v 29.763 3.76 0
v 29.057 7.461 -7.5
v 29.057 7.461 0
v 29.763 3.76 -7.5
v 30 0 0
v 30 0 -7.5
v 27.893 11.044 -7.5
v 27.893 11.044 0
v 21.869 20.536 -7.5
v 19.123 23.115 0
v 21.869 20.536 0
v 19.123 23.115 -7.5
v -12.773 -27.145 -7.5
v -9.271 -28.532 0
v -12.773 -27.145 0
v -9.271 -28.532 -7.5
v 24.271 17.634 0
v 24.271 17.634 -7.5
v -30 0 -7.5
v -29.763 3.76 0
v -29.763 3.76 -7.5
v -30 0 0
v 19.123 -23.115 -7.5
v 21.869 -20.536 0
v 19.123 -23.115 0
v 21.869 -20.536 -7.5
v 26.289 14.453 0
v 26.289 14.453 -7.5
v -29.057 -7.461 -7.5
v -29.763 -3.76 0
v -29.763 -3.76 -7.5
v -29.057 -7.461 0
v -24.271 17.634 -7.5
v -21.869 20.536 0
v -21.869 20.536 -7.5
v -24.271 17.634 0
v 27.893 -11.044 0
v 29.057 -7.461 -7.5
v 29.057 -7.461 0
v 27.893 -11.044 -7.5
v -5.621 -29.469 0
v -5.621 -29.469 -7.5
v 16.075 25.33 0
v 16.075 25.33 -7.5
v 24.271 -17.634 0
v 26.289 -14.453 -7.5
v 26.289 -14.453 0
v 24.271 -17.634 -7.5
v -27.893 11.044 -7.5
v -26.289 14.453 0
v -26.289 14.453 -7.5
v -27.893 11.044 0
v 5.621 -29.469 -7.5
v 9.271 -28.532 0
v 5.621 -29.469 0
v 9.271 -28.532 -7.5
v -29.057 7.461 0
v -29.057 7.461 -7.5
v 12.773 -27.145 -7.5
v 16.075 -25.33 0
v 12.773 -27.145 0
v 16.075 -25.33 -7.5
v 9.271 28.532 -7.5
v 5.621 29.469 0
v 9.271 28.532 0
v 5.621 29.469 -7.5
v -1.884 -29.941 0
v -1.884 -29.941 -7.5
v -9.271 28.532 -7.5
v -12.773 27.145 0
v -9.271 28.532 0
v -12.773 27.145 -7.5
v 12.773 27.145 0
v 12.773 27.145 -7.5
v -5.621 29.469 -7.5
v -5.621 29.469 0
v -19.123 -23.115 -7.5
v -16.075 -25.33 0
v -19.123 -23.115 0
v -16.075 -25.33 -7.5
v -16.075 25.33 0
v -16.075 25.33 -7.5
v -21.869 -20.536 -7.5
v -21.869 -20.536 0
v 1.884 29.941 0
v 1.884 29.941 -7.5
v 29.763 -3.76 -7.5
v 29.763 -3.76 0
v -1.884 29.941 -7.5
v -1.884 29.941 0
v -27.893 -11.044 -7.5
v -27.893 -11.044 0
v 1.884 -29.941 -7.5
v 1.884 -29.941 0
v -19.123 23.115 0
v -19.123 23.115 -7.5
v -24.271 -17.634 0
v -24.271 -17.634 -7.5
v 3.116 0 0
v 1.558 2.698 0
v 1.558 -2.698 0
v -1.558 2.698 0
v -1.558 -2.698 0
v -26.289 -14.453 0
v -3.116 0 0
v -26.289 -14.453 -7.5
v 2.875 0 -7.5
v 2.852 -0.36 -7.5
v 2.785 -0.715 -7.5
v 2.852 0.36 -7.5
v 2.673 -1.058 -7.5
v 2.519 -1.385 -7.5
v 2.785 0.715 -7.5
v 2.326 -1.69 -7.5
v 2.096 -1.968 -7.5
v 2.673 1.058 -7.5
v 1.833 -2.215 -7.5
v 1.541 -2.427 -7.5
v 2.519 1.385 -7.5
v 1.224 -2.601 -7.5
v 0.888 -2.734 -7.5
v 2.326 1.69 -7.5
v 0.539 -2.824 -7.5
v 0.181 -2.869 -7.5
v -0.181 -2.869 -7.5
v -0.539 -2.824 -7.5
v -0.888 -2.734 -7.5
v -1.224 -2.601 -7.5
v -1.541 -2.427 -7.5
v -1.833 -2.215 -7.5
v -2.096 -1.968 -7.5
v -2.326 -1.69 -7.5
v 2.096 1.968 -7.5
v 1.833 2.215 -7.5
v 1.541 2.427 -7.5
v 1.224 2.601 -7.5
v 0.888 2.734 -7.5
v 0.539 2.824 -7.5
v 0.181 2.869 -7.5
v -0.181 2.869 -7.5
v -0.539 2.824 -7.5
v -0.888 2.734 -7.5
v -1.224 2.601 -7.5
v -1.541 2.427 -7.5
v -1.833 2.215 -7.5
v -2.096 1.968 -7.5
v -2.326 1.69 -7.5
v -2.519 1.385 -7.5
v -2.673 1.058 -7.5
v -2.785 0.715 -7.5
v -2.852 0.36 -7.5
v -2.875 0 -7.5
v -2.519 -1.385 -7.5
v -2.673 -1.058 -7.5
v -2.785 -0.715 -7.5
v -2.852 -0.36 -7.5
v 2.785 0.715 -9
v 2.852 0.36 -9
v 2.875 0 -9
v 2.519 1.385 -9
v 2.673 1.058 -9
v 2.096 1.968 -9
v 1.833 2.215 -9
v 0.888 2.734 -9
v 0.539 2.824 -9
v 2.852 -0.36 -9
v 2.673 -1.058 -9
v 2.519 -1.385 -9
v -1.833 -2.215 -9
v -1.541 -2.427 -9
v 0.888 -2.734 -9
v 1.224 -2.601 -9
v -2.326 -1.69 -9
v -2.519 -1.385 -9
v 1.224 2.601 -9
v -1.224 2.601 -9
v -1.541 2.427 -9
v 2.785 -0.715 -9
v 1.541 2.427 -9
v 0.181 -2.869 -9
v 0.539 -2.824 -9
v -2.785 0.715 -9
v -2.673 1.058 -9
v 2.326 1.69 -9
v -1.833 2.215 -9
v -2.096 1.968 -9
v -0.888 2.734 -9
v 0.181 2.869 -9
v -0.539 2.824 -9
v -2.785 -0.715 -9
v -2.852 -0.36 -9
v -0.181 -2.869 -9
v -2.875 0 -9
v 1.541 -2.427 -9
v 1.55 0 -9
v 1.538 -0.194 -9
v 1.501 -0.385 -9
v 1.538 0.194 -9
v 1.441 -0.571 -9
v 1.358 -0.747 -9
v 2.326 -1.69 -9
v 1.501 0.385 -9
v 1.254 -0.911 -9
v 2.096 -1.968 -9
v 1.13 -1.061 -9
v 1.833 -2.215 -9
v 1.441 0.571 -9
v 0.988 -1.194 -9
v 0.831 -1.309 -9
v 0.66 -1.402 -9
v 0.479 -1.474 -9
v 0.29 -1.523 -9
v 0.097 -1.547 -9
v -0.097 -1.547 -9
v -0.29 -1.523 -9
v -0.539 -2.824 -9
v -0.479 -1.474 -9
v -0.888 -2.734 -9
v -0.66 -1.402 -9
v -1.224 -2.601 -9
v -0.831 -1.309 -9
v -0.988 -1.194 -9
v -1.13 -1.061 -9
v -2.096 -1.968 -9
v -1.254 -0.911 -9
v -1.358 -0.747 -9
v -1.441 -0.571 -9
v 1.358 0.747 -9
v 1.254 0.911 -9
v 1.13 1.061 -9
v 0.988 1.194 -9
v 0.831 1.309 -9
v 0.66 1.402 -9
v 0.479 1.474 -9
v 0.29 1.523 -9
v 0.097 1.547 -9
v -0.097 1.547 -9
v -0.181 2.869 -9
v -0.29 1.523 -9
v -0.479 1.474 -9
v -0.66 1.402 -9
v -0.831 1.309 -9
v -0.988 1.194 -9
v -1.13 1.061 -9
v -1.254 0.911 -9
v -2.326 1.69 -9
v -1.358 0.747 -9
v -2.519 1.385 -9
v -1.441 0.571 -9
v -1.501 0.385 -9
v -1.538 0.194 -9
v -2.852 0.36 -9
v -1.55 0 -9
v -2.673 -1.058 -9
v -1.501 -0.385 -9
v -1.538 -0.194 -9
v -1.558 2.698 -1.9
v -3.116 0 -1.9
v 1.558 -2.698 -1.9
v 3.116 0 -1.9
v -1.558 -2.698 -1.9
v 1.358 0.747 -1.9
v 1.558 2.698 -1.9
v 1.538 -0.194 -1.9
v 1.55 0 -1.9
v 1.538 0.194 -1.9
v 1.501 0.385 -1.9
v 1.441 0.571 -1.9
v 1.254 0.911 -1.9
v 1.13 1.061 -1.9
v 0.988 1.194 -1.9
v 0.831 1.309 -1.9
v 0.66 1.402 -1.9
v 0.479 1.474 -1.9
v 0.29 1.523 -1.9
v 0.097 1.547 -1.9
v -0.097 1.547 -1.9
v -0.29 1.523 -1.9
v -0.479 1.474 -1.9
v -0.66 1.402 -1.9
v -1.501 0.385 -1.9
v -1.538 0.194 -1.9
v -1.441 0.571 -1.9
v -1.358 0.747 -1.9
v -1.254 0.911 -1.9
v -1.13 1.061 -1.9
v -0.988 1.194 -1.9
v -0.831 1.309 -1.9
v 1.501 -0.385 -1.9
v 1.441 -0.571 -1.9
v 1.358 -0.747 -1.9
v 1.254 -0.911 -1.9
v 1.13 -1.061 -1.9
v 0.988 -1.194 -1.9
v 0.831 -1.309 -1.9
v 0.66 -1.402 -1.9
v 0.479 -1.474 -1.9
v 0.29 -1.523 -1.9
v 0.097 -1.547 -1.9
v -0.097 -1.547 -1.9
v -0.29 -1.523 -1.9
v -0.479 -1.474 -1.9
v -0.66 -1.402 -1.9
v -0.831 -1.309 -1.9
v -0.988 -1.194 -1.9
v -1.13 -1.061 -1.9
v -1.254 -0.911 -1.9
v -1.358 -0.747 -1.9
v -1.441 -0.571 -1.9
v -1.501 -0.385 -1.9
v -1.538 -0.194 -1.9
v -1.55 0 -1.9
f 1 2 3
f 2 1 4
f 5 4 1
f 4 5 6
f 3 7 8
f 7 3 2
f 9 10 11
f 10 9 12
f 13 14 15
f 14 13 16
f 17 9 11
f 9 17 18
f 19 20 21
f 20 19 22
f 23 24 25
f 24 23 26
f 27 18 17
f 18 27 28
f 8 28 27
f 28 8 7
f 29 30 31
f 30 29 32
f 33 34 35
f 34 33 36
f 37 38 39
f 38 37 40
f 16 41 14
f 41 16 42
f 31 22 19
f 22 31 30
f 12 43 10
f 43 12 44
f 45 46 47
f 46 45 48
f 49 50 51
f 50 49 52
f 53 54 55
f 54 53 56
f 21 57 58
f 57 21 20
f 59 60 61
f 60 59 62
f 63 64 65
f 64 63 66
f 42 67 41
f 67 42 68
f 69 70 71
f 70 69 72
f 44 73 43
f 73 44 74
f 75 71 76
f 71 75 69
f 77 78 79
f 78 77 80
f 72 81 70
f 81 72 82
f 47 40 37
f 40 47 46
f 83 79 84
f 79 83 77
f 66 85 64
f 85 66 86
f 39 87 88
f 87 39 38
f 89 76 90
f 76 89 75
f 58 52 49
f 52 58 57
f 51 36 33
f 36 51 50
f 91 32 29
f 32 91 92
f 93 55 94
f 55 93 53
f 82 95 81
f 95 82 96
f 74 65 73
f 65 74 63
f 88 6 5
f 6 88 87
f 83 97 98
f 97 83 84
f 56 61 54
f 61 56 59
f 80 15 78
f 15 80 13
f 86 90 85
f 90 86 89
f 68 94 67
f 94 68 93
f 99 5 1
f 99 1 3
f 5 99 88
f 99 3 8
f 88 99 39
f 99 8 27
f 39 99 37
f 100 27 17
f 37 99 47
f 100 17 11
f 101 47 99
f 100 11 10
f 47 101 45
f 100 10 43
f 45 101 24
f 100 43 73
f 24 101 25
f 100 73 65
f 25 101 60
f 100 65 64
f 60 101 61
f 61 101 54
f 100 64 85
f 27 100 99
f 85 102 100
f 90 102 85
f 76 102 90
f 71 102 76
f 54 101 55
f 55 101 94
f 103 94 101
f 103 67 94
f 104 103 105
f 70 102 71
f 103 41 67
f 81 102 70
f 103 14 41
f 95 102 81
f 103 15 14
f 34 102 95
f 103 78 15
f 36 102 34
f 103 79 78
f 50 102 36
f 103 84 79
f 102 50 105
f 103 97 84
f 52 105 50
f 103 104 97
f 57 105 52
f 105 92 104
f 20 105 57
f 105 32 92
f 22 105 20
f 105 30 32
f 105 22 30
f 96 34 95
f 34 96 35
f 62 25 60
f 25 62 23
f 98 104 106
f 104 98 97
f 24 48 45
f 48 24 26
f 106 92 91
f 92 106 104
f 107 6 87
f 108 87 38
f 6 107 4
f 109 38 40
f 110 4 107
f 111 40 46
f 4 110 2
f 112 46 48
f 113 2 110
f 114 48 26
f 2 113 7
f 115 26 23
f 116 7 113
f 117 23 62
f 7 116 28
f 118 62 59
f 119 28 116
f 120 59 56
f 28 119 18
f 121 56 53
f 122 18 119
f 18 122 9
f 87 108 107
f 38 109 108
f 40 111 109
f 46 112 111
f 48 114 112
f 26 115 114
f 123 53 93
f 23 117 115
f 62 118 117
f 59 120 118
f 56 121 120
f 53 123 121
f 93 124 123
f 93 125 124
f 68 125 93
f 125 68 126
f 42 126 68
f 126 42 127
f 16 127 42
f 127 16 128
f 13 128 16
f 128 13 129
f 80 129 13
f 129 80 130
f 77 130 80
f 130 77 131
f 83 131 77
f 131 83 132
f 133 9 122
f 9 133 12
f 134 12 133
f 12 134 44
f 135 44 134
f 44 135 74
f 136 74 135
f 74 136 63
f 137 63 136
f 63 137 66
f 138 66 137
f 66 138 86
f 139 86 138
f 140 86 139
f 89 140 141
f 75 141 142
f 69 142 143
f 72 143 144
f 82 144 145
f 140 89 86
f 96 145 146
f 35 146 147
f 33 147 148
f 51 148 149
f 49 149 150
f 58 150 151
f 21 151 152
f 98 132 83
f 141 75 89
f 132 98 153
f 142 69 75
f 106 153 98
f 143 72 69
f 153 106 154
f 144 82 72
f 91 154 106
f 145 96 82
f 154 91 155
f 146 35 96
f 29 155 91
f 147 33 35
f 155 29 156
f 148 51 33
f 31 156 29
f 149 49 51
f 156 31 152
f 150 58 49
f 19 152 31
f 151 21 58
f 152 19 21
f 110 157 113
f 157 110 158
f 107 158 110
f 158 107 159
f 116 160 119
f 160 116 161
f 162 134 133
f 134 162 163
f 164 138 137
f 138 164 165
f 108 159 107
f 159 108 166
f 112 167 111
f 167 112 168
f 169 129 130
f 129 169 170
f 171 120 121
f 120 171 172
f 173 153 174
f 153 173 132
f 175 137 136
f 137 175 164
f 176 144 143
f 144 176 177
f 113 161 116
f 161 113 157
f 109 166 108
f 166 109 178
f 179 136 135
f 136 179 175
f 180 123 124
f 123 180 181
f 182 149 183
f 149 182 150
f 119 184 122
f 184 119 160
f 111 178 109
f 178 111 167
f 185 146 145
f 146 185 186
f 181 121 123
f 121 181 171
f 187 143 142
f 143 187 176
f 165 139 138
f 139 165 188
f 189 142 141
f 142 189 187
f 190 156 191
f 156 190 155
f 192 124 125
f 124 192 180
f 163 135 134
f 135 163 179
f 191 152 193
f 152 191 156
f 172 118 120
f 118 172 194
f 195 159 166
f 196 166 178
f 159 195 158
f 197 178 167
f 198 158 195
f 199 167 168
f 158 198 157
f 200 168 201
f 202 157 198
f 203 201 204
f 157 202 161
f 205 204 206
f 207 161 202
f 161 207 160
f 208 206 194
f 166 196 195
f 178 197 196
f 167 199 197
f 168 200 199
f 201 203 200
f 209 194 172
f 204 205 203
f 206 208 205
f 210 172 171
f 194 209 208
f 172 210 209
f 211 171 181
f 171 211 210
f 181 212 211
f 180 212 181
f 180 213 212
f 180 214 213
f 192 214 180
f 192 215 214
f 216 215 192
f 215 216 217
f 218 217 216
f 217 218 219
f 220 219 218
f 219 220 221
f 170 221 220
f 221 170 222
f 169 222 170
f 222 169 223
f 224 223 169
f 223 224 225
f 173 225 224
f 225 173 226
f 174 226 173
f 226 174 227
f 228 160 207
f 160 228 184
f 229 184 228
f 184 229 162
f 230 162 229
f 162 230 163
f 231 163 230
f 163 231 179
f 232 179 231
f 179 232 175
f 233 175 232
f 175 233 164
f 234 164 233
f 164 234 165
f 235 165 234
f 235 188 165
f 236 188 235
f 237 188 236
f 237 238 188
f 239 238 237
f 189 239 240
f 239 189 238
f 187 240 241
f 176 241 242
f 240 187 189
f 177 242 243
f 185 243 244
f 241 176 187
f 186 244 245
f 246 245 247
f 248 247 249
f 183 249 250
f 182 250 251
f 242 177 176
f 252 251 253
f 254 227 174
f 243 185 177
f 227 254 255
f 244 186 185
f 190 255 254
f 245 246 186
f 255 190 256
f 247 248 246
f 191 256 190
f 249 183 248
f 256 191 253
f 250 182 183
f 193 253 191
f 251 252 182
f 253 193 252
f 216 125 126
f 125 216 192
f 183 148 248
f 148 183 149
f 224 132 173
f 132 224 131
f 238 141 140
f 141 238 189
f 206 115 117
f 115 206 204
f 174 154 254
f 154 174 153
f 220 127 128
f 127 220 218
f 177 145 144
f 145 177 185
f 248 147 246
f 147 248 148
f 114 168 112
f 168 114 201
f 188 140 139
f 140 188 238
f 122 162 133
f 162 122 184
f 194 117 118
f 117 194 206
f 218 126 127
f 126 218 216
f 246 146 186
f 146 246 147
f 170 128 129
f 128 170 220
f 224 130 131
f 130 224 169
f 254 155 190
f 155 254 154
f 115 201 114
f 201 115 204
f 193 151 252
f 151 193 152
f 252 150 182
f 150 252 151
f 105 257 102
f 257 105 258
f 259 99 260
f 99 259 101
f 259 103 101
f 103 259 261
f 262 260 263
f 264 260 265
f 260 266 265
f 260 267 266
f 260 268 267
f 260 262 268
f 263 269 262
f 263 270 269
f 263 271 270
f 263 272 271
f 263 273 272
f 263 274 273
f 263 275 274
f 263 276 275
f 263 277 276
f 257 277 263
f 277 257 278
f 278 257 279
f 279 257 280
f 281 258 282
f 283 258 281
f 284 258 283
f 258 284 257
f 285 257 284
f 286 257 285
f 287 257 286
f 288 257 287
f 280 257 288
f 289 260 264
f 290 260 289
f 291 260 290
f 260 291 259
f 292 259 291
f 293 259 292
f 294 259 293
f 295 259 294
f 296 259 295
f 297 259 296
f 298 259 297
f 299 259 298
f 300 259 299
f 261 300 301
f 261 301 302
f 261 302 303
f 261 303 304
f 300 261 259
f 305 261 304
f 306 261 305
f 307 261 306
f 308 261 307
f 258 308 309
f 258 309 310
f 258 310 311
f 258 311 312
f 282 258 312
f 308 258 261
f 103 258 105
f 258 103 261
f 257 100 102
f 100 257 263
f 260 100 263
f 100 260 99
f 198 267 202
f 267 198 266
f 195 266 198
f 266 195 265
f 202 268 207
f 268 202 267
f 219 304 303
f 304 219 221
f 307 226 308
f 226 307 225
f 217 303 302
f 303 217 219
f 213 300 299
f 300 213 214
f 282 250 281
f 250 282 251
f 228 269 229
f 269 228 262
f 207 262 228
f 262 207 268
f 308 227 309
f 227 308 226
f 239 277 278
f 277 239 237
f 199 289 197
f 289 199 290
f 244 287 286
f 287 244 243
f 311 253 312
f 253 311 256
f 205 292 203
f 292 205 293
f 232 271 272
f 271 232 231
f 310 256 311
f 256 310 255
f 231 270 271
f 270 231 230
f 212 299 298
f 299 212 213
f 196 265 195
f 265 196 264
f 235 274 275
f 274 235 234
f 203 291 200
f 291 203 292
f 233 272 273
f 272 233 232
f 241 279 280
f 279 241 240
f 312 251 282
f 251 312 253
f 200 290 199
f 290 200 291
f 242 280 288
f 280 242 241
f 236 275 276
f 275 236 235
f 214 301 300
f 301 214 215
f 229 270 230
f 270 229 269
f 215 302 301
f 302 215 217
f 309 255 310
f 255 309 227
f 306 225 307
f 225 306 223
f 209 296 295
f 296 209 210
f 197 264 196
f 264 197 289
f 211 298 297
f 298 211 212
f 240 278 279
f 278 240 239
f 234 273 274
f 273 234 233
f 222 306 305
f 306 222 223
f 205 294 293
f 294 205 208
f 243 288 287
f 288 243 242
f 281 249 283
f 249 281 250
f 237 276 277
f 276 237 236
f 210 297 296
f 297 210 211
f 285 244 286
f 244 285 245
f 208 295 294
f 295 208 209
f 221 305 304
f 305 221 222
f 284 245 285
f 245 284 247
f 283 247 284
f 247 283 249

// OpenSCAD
$fn = 50;


difference() {
	union() {
		translate(v = [0, 0, -7.5000000000]) {
			cylinder(h = 7.5000000000, r = 30.0000000000);
		}
		#translate(v = [0, 0, -9.0000000000]) {
			cylinder(h = 9, r = 2.8750000000);
		}
	}
	union() {
		translate(v = [0, 0, 0]) {
			rotate(a = [0, 0, 0]) {
				difference() {
					union() {
						translate(v = [0, 0, -1.9000000000]) {
							linear_extrude(height = 1.9000000000) {
								polygon(points = [[3.1158000000, 0.0000000000], [1.5579000000, 2.6983619531], [-1.5579000000, 2.6983619531], [-3.1158000000, 0.0000000000], [-1.5579000000, -2.6983619531], [1.5579000000, -2.6983619531]]);
							}
						}
					}
					union();
				}
			}
		}
		#translate(v = [0, 0, -100.0000000000]) {
			cylinder(h = 200, r = 1.5500000000);
		}
	}
}
